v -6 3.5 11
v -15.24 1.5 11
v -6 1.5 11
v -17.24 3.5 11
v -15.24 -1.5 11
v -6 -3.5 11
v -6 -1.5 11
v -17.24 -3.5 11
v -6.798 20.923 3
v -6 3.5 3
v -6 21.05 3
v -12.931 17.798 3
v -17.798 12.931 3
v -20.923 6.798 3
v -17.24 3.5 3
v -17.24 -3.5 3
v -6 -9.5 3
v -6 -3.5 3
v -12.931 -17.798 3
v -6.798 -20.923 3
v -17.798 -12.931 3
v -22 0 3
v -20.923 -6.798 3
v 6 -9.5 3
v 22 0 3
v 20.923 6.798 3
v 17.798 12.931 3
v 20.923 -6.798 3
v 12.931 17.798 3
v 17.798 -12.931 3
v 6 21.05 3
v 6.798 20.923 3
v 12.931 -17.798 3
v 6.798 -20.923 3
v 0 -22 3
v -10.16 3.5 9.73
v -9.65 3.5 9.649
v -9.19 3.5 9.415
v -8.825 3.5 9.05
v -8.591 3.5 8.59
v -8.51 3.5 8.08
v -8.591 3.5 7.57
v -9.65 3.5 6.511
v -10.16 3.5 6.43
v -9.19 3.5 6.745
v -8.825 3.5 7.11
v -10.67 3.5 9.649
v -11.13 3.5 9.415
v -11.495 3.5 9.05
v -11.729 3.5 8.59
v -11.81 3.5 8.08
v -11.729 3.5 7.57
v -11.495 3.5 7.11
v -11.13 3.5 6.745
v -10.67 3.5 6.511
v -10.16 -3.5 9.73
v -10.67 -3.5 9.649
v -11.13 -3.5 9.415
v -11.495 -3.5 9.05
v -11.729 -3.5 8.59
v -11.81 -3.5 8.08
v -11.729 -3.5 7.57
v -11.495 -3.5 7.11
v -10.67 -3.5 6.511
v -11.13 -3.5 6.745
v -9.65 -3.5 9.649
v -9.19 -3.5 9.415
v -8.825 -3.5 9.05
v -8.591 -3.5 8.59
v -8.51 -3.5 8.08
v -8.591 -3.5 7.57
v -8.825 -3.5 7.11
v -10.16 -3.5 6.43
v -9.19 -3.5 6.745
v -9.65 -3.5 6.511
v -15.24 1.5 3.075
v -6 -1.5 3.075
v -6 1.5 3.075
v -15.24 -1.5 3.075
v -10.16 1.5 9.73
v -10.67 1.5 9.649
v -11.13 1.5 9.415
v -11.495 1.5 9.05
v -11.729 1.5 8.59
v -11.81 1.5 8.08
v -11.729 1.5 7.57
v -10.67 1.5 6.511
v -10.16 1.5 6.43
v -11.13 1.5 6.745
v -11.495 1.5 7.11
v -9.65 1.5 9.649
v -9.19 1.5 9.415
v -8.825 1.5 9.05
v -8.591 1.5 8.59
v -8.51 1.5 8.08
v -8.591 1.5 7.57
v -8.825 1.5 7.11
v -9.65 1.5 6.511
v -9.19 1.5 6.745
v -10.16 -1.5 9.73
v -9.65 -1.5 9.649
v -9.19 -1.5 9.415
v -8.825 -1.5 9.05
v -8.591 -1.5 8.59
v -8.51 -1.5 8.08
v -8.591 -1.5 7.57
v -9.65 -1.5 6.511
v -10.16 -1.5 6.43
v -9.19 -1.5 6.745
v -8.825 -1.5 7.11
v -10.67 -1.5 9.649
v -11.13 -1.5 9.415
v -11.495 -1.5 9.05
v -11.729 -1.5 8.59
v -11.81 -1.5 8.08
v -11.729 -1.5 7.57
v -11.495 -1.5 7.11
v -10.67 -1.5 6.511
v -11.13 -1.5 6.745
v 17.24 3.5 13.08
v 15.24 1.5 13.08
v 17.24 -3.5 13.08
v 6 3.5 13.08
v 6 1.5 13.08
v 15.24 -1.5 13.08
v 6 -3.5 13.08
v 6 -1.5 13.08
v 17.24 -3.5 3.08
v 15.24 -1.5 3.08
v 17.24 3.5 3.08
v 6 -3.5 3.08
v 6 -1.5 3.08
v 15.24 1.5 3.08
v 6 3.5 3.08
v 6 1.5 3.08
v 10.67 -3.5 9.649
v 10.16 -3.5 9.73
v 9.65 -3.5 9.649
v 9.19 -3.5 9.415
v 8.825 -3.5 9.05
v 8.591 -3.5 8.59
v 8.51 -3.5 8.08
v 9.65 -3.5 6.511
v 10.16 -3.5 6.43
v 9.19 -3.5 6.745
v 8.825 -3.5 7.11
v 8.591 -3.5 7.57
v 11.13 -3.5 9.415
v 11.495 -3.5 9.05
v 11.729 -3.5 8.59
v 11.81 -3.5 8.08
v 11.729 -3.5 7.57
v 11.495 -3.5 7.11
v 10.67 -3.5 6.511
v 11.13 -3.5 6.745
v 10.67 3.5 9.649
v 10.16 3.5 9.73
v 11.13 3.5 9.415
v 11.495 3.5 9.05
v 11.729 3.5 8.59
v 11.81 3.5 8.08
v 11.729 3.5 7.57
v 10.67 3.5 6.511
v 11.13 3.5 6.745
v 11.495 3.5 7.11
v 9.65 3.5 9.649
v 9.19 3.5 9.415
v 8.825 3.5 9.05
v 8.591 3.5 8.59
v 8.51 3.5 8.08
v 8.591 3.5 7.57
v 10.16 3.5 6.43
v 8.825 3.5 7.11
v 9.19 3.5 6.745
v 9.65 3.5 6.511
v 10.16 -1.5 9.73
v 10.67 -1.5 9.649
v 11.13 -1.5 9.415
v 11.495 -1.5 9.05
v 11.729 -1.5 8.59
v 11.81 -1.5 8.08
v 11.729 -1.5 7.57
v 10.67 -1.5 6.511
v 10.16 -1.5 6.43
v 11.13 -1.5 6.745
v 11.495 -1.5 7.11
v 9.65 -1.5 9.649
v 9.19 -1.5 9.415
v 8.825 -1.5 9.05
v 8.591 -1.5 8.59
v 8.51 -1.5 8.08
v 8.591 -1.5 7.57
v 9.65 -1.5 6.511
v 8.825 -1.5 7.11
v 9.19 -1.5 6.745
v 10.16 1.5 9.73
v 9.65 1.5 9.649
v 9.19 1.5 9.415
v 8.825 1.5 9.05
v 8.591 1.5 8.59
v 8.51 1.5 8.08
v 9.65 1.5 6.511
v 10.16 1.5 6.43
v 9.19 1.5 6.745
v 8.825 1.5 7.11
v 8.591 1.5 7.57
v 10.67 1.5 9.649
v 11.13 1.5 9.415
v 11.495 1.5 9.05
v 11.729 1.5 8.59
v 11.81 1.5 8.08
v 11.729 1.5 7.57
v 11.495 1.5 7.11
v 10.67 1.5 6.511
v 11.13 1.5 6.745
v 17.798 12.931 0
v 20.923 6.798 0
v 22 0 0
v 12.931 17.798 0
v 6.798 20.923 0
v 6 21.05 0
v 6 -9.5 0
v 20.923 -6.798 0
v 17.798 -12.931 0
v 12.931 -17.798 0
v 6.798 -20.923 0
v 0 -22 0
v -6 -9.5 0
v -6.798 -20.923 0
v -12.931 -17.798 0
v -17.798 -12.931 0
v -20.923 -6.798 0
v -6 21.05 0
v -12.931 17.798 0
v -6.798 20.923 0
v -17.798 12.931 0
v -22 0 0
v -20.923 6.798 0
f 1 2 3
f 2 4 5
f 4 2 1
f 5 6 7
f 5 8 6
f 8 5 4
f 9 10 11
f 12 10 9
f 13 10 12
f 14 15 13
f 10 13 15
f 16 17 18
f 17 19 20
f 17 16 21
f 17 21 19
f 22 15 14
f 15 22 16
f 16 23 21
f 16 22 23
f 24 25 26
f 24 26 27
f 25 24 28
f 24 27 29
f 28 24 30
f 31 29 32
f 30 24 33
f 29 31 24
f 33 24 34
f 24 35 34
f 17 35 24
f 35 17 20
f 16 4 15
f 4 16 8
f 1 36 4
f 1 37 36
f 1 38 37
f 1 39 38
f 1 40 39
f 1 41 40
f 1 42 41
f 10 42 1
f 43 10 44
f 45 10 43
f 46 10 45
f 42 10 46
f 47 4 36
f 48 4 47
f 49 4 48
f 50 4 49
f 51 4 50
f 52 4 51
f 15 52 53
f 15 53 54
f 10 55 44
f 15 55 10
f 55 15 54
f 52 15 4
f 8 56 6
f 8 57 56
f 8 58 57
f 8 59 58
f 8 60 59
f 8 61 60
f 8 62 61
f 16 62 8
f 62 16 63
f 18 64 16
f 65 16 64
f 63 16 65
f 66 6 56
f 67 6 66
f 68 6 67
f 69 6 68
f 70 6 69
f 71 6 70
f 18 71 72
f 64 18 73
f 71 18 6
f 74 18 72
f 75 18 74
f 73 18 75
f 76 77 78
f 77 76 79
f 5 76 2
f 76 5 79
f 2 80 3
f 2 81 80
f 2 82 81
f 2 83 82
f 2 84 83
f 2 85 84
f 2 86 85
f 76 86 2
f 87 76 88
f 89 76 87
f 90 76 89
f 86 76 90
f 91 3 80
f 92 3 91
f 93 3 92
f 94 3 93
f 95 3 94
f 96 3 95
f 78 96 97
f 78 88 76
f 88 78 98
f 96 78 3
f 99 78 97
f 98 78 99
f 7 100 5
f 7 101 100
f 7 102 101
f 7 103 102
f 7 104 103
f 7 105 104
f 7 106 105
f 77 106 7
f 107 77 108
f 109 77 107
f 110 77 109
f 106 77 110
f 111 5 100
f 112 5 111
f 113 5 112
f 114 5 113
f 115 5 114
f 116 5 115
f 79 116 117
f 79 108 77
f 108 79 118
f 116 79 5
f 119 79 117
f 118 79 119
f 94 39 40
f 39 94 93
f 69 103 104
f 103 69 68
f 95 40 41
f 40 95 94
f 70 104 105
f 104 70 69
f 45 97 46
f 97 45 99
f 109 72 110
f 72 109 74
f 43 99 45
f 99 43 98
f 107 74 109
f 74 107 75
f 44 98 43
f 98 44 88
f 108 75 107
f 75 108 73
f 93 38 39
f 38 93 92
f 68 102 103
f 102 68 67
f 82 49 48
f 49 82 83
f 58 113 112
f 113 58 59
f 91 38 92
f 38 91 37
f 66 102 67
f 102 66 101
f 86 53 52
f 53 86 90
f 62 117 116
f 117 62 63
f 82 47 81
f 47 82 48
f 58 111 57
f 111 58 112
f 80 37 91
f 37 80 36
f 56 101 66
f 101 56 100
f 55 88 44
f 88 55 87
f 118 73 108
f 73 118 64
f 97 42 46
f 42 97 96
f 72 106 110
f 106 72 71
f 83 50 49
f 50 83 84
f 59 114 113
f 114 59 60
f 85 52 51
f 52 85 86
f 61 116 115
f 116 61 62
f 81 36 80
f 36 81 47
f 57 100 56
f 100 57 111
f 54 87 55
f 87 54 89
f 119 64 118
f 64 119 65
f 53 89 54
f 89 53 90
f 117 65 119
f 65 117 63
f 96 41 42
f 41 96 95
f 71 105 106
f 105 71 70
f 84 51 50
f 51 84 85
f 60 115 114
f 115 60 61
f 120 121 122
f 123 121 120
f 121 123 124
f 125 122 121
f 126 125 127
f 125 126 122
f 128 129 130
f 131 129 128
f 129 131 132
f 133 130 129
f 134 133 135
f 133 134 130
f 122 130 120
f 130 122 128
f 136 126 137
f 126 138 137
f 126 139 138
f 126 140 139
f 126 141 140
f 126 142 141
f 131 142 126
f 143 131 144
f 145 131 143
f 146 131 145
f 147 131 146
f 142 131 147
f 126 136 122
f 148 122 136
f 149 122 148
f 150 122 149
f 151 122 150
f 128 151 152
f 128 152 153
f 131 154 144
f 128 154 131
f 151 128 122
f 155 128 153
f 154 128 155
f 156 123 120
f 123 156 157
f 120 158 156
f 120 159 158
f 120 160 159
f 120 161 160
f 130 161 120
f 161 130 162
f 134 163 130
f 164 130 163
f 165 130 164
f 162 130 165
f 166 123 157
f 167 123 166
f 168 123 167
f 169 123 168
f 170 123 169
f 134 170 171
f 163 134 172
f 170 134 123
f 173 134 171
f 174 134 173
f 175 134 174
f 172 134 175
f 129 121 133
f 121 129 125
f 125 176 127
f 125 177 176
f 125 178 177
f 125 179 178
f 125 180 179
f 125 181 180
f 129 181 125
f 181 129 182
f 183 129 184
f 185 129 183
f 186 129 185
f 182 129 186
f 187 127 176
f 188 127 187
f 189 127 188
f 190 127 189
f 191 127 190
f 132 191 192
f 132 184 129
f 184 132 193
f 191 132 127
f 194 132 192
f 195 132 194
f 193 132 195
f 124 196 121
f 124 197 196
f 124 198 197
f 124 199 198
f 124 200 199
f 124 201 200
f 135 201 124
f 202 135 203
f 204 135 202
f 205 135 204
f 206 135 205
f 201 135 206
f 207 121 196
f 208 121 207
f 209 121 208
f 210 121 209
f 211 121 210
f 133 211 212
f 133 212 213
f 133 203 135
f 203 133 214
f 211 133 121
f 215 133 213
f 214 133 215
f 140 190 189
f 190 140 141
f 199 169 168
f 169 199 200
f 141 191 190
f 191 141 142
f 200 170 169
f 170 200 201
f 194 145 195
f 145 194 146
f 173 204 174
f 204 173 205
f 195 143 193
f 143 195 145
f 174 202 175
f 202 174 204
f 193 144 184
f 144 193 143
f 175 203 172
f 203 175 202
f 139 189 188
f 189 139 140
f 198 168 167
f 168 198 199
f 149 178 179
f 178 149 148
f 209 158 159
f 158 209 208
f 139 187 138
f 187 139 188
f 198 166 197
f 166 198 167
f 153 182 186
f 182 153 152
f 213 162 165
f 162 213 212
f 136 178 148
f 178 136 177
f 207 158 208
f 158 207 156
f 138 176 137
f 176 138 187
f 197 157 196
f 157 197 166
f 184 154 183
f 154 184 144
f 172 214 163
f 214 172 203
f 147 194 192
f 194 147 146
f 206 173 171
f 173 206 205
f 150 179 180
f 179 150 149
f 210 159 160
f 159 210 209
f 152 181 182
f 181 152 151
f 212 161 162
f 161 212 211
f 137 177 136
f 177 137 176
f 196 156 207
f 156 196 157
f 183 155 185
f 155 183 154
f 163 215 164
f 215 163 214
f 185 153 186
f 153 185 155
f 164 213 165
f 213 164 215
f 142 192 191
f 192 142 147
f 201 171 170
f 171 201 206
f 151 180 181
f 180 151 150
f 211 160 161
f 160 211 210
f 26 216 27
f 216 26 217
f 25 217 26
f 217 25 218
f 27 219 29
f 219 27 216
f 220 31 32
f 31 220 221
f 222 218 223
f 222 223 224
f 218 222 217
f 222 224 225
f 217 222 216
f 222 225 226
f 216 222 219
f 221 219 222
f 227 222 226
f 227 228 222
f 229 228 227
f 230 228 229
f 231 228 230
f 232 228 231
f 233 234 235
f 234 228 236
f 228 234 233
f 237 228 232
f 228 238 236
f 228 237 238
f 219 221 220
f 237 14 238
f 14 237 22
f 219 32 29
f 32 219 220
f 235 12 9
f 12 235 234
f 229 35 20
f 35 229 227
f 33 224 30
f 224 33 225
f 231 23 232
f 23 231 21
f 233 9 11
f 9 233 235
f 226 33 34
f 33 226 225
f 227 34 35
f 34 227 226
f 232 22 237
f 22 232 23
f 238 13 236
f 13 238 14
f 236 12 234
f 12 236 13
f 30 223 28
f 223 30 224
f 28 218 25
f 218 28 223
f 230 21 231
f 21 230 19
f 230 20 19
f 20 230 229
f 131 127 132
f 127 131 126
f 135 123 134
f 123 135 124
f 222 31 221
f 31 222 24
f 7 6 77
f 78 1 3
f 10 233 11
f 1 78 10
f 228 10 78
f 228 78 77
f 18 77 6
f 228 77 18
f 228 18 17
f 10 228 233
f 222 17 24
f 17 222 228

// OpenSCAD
// file: lib/polyScrewThread_r1.scad
/*
 *    polyScrewThread_r1.scad    by aubenc @ Thingiverse
 *
 * This script contains the library modules that can be used to generate
 * threaded rods, screws and nuts.
 *
 * http://www.thingiverse.com/thing:8796
 *
 * CC Public Domain
 */

module screw_thread(od,st,lf0,lt,rs,cs)
{
    or=od/2;
    ir=or-st/2*cos(lf0)/sin(lf0);
    pf=2*PI*or;
    sn=floor(pf/rs);
    lfxy=360/sn;
    ttn=round(lt/st+1);
    zt=st/sn;

    intersection()
    {
        if (cs >= -1)
        {
           thread_shape(cs,lt,or,ir,sn,st);
        }

        full_thread(ttn,st,sn,zt,lfxy,or,ir);
    }
}

module hex_nut(df,hg,sth,clf,cod,crs)
{

    difference()
    {
        hex_head(hg,df);

        hex_countersink_ends(sth/2,cod,clf,crs,hg);

        screw_thread(cod,sth,clf,hg,crs,-2);
    }
}


module hex_screw(od,st,lf0,lt,rs,cs,df,hg,ntl,ntd)
{
    ntr=od/2-(st/2)*cos(lf0)/sin(lf0);

    union()
    {
        hex_head(hg,df);

        translate([0,0,hg])
        if ( ntl == 0 )
        {
            cylinder(h=0.01, r=ntr, center=true);
        }
        else
        {
            if ( ntd == -1 )
            {
                cylinder(h=ntl+0.01, r=ntr, $fn=floor(od*PI/rs), center=false);
            }
            else if ( ntd == 0 )
            {
                union()
                {
                    cylinder(h=ntl-st/2,
                             r=od/2, $fn=floor(od*PI/rs), center=false);

                    translate([0,0,ntl-st/2])
                    cylinder(h=st/2,
                             r1=od/2, r2=ntr, 
                             $fn=floor(od*PI/rs), center=false);
                }
            }
            else
            {
                cylinder(h=ntl, r=ntd/2, $fn=ntd*PI/rs, center=false);
            }
        }

        translate([0,0,ntl+hg]) screw_thread(od,st,lf0,lt,rs,cs);
    }
}

module hex_screw_0(od,st,lf0,lt,rs,cs,df,hg,ntl,ntd)
{
    ntr=od/2-(st/2)*cos(lf0)/sin(lf0);

    union()
    {
        hex_head_0(hg,df);

        translate([0,0,hg])
        if ( ntl == 0 )
        {
            cylinder(h=0.01, r=ntr, center=true);
        }
        else
        {
            if ( ntd == -1 )
            {
                cylinder(h=ntl+0.01, r=ntr, $fn=floor(od*PI/rs), center=false);
            }
            else if ( ntd == 0 )
            {
                union()
                {
                    cylinder(h=ntl-st/2,
                             r=od/2, $fn=floor(od*PI/rs), center=false);

                    translate([0,0,ntl-st/2])
                    cylinder(h=st/2,
                             r1=od/2, r2=ntr, 
                             $fn=floor(od*PI/rs), center=false);
                }
            }
            else
            {
                cylinder(h=ntl, r=ntd/2, $fn=ntd*PI/rs, center=false);
            }
        }

        translate([0,0,ntl+hg]) screw_thread(od,st,lf0,lt,rs,cs);
    }
}

module thread_shape(cs,lt,or,ir,sn,st)
{
    if ( cs == 0 )
    {
        cylinder(h=lt, r=or, $fn=sn, center=false);
    }
    else
    {
        union()
        {
            translate([0,0,st/2])
              cylinder(h=lt-st+0.005, r=or, $fn=sn, center=false);

            if ( cs == -1 || cs == 2 )
            {
                cylinder(h=st/2, r1=ir, r2=or, $fn=sn, center=false);
            }
            else
            {
                cylinder(h=st/2, r=or, $fn=sn, center=false);
            }

            translate([0,0,lt-st/2])
            if ( cs == 1 || cs == 2 )
            {
                  cylinder(h=st/2, r1=or, r2=ir, $fn=sn, center=false);
            }
            else
            {
                cylinder(h=st/2, r=or, $fn=sn, center=false);
            }
        }
    }
}

module full_thread(ttn,st,sn,zt,lfxy,or,ir)
{
  if(ir >= 0.2)
  {
    for(i=[0:ttn-1])
    {
        for(j=[0:sn-1])
			assign( pt = [	[0,                  0,                  i*st-st            ],
                        [ir*cos(j*lfxy),     ir*sin(j*lfxy),     i*st+j*zt-st       ],
                        [ir*cos((j+1)*lfxy), ir*sin((j+1)*lfxy), i*st+(j+1)*zt-st   ],
								[0,0,i*st],
                        [or*cos(j*lfxy),     or*sin(j*lfxy),     i*st+j*zt-st/2     ],
                        [or*cos((j+1)*lfxy), or*sin((j+1)*lfxy), i*st+(j+1)*zt-st/2 ],
                        [ir*cos(j*lfxy),     ir*sin(j*lfxy),     i*st+j*zt          ],
                        [ir*cos((j+1)*lfxy), ir*sin((j+1)*lfxy), i*st+(j+1)*zt      ],
                        [0,                  0,                  i*st+st            ]	])
        {
            polyhedron(points=pt,
              		  triangles=[	[1,0,3],[1,3,6],[6,3,8],[1,6,4],
											[0,1,2],[1,4,2],[2,4,5],[5,4,6],[5,6,7],[7,6,8],
											[7,8,3],[0,2,3],[3,2,7],[7,2,5]	]);
        }
    }
  }
  else
  {
    echo("Step Degrees too agresive, the thread will not be made!!");
    echo("Try to increase de value for the degrees and/or...");
    echo(" decrease the pitch value and/or...");
    echo(" increase the outer diameter value.");
  }
}

module hex_head(hg,df)
{
	rd0=df/2/sin(60);
	x0=0;	x1=df/2;	x2=x1+hg/2;
	y0=0;	y1=hg/2;	y2=hg;

	intersection()
	{
	   cylinder(h=hg, r=rd0, $fn=6, center=false);

		rotate_extrude(convexity=10, $fn=6*round(df*PI/6/0.5))
		polygon([ [x0,y0],[x1,y0],[x2,y1],[x1,y2],[x0,y2] ]);
	}
}

module hex_head_0(hg,df)
{
    cylinder(h=hg, r=df/2/sin(60), $fn=6, center=false);
}

module hex_countersink_ends(chg,cod,clf,crs,hg)
{
    translate([0,0,-0.1])
    cylinder(h=chg+0.01, 
             r1=cod/2, 
             r2=cod/2-(chg+0.1)*cos(clf)/sin(clf),
             $fn=floor(cod*PI/crs), center=false);

    translate([0,0,hg-chg+0.1])
    cylinder(h=chg+0.01, 
             r1=cod/2-(chg+0.1)*cos(clf)/sin(clf),
             r2=cod/2, 
             $fn=floor(cod*PI/crs), center=false);
}
// file: ../configuration.scad
//$fn=40; // model faces resolution.

//COMMON PARAMETERS
global_clearance = 0.5; // additional space where needed due to printer precision
layer_thickness = 0.3; // layer which is going to be removed after printing
//M3 x 12 Bolt
M3_nut_diameter = 6.6;
M3_nut_height = 2.7;
M3_bolt_diameter = 3.2;
M3_bolt_head_height = 3;
M3_bolt_length = 12;
//M5 Bolt
M5_bolt_diameter = 5.5;
M5_nut_height = 4.5;
M5_nut_diameter = 9.4;
//M6 Bolt
M6_bolt_diameter = 6.5;
M6_nut_height = 4.9;
M6_nut_diameter = 11.8;


//----------------------------------------------------------------
//----------------------------------------------------------------
//WINDGAUGE02A_S02 - Parametry pro hlavni valec anemometru
S01_hloubka_zavitu=4;
S01_vyska=110; //80
S01_prumer_vnitrni=50;
S01_sila_materialu=1.2;
S01_vyska_horni_zavit=10;
S01_vyska_spodniho_zavitu=10;
S01_sila_drzaku_RJ11=3; //vyška drážky
S01_hrana_A_RJ11=12.3;
S01_hrana_B_RJ11=19;
S01_tolerance_zavit=1.5;

//Rozměry ložiska se závity
//LO_spodni_prumer=22;
LO_spodni_prumer=16.7; //bez krytu
slip_ring_mount_height=1.5;
slip_ring_mount_diameter=16.7;
LO_horni_prumer=7.7;
//LO_vyska_spodni_doraz=5;
//LO_vyska_horni_doraz=9;
//LO_vyska_dorazu=0;
slip_ring_body_height = 16;
slip_ring_body_diameter = 19.8;



//Obecné parametry
prumer_osicky=5.1;



//Parametry loziska
lozisko_prumer_vnitrni=4.9;
lozisko_prumer_vnejsi=16.1;
lozisko_vyska=5;
lozisko_prekryv=1.5;

//Parametry magnetu
magnet_prumer=6.3;
magnet_vyska=5;
magnet_zapusteni=2;
magnet_tolerance_prumeru=0.2;

//Parametry sroubu
prumer_sroubu=3.4;
prumer_hlavy_sroubu=8.2;
vyska_hlavy_sroubu=4.3;
vyska_matky=3;
sirka_matky=6.7;

sirka_matky_tol=0.175;
prumer_orechu=10;

//WINDGAUGE02A_R01 //pro lopatku
L01_hrana_drzaku_a=10;
L01_hrana_drzaku_b=3;
L01_delka_uchytu=19;
L01_prumer_lopatky=40;
L01_sila_materialu_lopatky=0.9;

//WINDGAUGE02A_D02 Anemometer holder
//   | |   Top ring with Screw-thread
//  /   \  Body
// |_____| Base
D02_magnet_base_height = 4.5 + 1.5*global_clearance; // HS-13 M5 magnet height without bolt
D02_magnet_diameter = 16.1 + global_clearance; // HS-13 M5 magnet diameter
D02_flat_magnet_diameter = 18.1 + global_clearance; // HS-13 M5 magnet diameter
D02_wall_thickness = 5; // body wall thickness
D02_connector_spacing = 40; // main body cut-through for connectors
D02_base_diameter = 140; // diameter of holder base
D02_base_height = max(M6_nut_height + 1.5,
                      D02_magnet_base_height + M5_nut_height/2 + 1.5); // height of holder base
D02_body_height = 60 - D02_base_height; // height of body between base and top ring
D02_screw_diameter = S01_prumer_vnitrni - S01_tolerance_zavit; // scew-thread diameter based on stand S01
D02_thread_height = S01_vyska_spodniho_zavitu; // screw-thread height based on stand S01
D02_top_ring_inner_diameter = D02_screw_diameter - 6; // inner diameter of top ring
D02_top_ring_outer_diameter = D02_screw_diameter + 4; // outer diameter of top ring
D02_top_ring_height = D02_thread_height + 5; // height of top ring
D02_total_height = D02_base_height + D02_body_height + D02_top_ring_height; // total height of anemometer holder
// Following parameters are obsolete, maintained only for compatibility.
D01_material_pod_zavitem = D02_top_ring_height - D02_thread_height;
D01_material_za_zavitem = D02_screw_diameter - D02_top_ring_inner_diameter;
D01_material_pred_zavitem = D02_top_ring_outer_diameter - D02_screw_diameter;
D01_polomer_zakladny = D02_base_diameter/2;
D01_sila_setny_spodniho_drzaku=D02_wall_thickness;
D01_vyska_spodni_casti_drzaku = D02_body_height + D02_base_height;
D01_sirka_otvoru_pro_konektor = D02_connector_spacing;
D01_ucyhtna_matice_material_nad = D02_base_height - M6_nut_height;
D01_uchytna_matice_vyska = M6_nut_height;
D01_uchytna_matice_sirka = M6_nut_diameter;
D01_uchytny_sroub_prumer = M6_bolt_diameter;

// Following parameters are actually used in D01 model.
//WINDGAUGE02A_D02 //uchyt na sloup
D02_sila_materialu=6;
D02_vyska_uchytky=40;
D02_prumer_obruby=27; // 3/4 trubka
D02_delka_celeho_uchytu=60;
D02_dotahova_vzdalenost=1.5;
D02_prumer_uchytneho_sroubu=4.2;
D02_sirka_matky=9.1; //pro M4
D02_vyska_matky=3;


//WINDGAUGE02A_R01 //rotor s prekritim statoru
R01_vyska_prekryti_statoru=10;
R01_sila_materialu_pro_prekriti=1.3;
R01_mezera_mezi_statorem_rotorem=3;

//WINDGAUGE02A_R03 //drzak magnetu
R05_sirka_matky=10;



R03_prumer_zavitu=40;
R04_zavit_vyska=5;
R02_zavit_vyska=10;
R01_zavit_vyska=5;
R03_mezera_mezi_statorem_rotorem=3;

R02_delka_kridla=45;
R02_vzdalenost_der=25;

R02_delka_vyrovnnavaci_tyce=35;
R02_hrana_drzaku=14;
R02_sila_materialu_pod_tyci=5;
R02_sila_materialu_kridla=1.2;
R02_sila_materialu_kridla_tolerance=0.3;

R05_vyska_kridla=100;
R05_delka_kridla=100;


//S04
I2CDIFF01A_sirka_kon=16.5; //sirka konektoru
I2CDIFF01A_vyska_kon=13.5; //vyska konektoru
I2CDIFF01A_sirka_mod_otvory=4; //kolik modul zabira der
I2CDIFF01A_vyska_PCB=2; //vyska mezi albase a konektorem
S04_sila_materialu=2;

//S04_USBI2C01A
USBI2C01A_sirka_kon=12; //sirka konektoru
USBI2C01A_vyska_kon=11; //vyska konektoru
USBI2C01A_sirka_mod_otvory=3; //kolik modul zabira der
USBI2C01A_vyska_PCB=2; //vyska mezi albase a konektorem


//WINDGAUGE03A_R03 // Venturi tube
R03_wide_D = 36; // Venturi wide tube inner diameter
R03_narrow_D = R03_wide_D/1.7; // Venturi narrow tube inner diameter
R03_global_clearance = global_clearance; // additional space where needed due to printer precision
R03_PCB_top_rim = 5.5; // vertical distance from top of tube to top of PCB
R03_PCB_height = 41; // height of PCB casing - if changed check casing
R03_PCB_width = 14; // width of PCB casing - if changed check casing
R03_PCB_depth = 3.7; // depth of PCB casing - if changed check casing
R03_PCB_connector_overlay = 2.5; // additional depth of PCB casing on connectors side - if changed check casing
R03_PCB_elevation = 2; // additional elevation of PCB for waterproofing
R03_air_tube_diameter = 2; // air tubes diameter
R03_sensor_housing_offset = 15;  // distance from venturi tube height to sensor housing drop
R03_sensor_offset = 2.2;  // SDP33 distance from PCB border to sensor
R03_sensor_pitch = 4.3;  // SDP33 distance between sensors
R03_sensor_diameter = 3.5;  // SDP33 sensor diameter
R03_sensor_depth = 2.5;  // SDP33 sensor depth
R03_slip_ring_offset = 0; // slip-ring offset from tube center
R03_venturi_tube_height = 150;  // Venturi tube height (limited by max print size)
R03_wall_thickness = 5; // Venturi tube wall thickness
R03_sealing_ring_thickness = 1.5; // sealing ring size
R03_fin_width = 0.8; // width of vertical stabilizator
R03_fin_length = 80; // length of vertical stabilizator
R03_fin_height = 150; // height of vertical stabilizator
R03_fin_holder_width = M3_bolt_length + M3_nut_height;
R03_fin_holder_height = M3_nut_diameter + 2*R03_wall_thickness;
R03_fin_holder_depth = R03_wide_D/2 + R03_fin_holder_height;
R03_balance_shelf_width = 20; // width of shelf for balance weights
R03_balance_shelf_height = 10; // height of shelf for balance weights
// main file
include <../configuration.scad>
include <./lib/polyScrewThread_r1.scad>

draft = true;
$fn = draft ? 20 : 100; // model faces resolution
PI=3.141592;

module DRZAK_VELKY()
{
    difference()
    {
        translate([-S04_sila_materialu/2, 0, 5.08])
            cube([10.16 + 1*S04_sila_materialu, 3 + 2*S04_sila_materialu, 10], true);

        translate([0, 0, 5.08])
            cube([10.16, 3, 10 + 0.01], true);

        translate([0, 5, 5.08])
            rotate ([90, 0, 0])
                cylinder(h = 30, r=(3.3 / 2));
    }
}

module DRZAK_MALY()
{
    difference()
    {
        translate([-S04_sila_materialu/2, 0, 4.0])
            cube([10.16 + 1*S04_sila_materialu, 3 + 2*S04_sila_materialu, 8], true);

        translate([0, 0, 5.08])
            cube([10.16, 3, 10 + 0.01], true);

        translate([0, 5, 5.08])
            rotate ([90, 0, 0])
                cylinder(h = 30, r=(3.3 / 2));
    }
}


//Držák pro modul USBI2C01A
module WINDGAUGE01A_S04_USBI2C01A(draft = true)
{
    difference()
    {
        union(){
            translate([0, 0, 0])
                cylinder(h = S01_sila_drzaku_RJ11,
                     r = S01_prumer_vnitrni/2 - S01_hloubka_zavitu/2 - 1.0);

                     
            //drzaky PCB 
            translate([-USBI2C01A_sirka_mod_otvory*10.16/2 + 5.08, 0, S01_sila_drzaku_RJ11])
                DRZAK_MALY();

            translate([USBI2C01A_sirka_mod_otvory*10.16/2-5.08, 0, S01_sila_drzaku_RJ11])
                rotate ([0, 0, 180])
                    DRZAK_VELKY();
             
                }   
        //otvor pro konektor
        translate([0, 0, S01_sila_drzaku_RJ11/2])
            cube([USBI2C01A_sirka_kon, S01_hrana_B_RJ11, S01_sila_drzaku_RJ11+30+0.01],
                 center=true);

        //otvor až ke kraji
        translate([0, (S01_prumer_vnitrni/2 - S01_hloubka_zavitu/2 + 0.5)/2,
                   S01_sila_drzaku_RJ11/2])
            cube([USBI2C01A_sirka_kon,
                  S01_prumer_vnitrni/2 - S01_hloubka_zavitu/2 + 0.5,
                  S01_sila_drzaku_RJ11+0.01],
                 center=true);
    }

    
    }

difference()
{
    // If not draft -> move to print position.
    if (!draft)
        translate([0, 0, 0])
            rotate([0, 0, 0])
                WINDGAUGE01A_S04_USBI2C01A(false);
    else
        WINDGAUGE01A_S04_USBI2C01A();
    // Cut-out cube not needed in this model
    //if (draft)
    //    translate([0, 0, 0])
    //        cube(10);
}
